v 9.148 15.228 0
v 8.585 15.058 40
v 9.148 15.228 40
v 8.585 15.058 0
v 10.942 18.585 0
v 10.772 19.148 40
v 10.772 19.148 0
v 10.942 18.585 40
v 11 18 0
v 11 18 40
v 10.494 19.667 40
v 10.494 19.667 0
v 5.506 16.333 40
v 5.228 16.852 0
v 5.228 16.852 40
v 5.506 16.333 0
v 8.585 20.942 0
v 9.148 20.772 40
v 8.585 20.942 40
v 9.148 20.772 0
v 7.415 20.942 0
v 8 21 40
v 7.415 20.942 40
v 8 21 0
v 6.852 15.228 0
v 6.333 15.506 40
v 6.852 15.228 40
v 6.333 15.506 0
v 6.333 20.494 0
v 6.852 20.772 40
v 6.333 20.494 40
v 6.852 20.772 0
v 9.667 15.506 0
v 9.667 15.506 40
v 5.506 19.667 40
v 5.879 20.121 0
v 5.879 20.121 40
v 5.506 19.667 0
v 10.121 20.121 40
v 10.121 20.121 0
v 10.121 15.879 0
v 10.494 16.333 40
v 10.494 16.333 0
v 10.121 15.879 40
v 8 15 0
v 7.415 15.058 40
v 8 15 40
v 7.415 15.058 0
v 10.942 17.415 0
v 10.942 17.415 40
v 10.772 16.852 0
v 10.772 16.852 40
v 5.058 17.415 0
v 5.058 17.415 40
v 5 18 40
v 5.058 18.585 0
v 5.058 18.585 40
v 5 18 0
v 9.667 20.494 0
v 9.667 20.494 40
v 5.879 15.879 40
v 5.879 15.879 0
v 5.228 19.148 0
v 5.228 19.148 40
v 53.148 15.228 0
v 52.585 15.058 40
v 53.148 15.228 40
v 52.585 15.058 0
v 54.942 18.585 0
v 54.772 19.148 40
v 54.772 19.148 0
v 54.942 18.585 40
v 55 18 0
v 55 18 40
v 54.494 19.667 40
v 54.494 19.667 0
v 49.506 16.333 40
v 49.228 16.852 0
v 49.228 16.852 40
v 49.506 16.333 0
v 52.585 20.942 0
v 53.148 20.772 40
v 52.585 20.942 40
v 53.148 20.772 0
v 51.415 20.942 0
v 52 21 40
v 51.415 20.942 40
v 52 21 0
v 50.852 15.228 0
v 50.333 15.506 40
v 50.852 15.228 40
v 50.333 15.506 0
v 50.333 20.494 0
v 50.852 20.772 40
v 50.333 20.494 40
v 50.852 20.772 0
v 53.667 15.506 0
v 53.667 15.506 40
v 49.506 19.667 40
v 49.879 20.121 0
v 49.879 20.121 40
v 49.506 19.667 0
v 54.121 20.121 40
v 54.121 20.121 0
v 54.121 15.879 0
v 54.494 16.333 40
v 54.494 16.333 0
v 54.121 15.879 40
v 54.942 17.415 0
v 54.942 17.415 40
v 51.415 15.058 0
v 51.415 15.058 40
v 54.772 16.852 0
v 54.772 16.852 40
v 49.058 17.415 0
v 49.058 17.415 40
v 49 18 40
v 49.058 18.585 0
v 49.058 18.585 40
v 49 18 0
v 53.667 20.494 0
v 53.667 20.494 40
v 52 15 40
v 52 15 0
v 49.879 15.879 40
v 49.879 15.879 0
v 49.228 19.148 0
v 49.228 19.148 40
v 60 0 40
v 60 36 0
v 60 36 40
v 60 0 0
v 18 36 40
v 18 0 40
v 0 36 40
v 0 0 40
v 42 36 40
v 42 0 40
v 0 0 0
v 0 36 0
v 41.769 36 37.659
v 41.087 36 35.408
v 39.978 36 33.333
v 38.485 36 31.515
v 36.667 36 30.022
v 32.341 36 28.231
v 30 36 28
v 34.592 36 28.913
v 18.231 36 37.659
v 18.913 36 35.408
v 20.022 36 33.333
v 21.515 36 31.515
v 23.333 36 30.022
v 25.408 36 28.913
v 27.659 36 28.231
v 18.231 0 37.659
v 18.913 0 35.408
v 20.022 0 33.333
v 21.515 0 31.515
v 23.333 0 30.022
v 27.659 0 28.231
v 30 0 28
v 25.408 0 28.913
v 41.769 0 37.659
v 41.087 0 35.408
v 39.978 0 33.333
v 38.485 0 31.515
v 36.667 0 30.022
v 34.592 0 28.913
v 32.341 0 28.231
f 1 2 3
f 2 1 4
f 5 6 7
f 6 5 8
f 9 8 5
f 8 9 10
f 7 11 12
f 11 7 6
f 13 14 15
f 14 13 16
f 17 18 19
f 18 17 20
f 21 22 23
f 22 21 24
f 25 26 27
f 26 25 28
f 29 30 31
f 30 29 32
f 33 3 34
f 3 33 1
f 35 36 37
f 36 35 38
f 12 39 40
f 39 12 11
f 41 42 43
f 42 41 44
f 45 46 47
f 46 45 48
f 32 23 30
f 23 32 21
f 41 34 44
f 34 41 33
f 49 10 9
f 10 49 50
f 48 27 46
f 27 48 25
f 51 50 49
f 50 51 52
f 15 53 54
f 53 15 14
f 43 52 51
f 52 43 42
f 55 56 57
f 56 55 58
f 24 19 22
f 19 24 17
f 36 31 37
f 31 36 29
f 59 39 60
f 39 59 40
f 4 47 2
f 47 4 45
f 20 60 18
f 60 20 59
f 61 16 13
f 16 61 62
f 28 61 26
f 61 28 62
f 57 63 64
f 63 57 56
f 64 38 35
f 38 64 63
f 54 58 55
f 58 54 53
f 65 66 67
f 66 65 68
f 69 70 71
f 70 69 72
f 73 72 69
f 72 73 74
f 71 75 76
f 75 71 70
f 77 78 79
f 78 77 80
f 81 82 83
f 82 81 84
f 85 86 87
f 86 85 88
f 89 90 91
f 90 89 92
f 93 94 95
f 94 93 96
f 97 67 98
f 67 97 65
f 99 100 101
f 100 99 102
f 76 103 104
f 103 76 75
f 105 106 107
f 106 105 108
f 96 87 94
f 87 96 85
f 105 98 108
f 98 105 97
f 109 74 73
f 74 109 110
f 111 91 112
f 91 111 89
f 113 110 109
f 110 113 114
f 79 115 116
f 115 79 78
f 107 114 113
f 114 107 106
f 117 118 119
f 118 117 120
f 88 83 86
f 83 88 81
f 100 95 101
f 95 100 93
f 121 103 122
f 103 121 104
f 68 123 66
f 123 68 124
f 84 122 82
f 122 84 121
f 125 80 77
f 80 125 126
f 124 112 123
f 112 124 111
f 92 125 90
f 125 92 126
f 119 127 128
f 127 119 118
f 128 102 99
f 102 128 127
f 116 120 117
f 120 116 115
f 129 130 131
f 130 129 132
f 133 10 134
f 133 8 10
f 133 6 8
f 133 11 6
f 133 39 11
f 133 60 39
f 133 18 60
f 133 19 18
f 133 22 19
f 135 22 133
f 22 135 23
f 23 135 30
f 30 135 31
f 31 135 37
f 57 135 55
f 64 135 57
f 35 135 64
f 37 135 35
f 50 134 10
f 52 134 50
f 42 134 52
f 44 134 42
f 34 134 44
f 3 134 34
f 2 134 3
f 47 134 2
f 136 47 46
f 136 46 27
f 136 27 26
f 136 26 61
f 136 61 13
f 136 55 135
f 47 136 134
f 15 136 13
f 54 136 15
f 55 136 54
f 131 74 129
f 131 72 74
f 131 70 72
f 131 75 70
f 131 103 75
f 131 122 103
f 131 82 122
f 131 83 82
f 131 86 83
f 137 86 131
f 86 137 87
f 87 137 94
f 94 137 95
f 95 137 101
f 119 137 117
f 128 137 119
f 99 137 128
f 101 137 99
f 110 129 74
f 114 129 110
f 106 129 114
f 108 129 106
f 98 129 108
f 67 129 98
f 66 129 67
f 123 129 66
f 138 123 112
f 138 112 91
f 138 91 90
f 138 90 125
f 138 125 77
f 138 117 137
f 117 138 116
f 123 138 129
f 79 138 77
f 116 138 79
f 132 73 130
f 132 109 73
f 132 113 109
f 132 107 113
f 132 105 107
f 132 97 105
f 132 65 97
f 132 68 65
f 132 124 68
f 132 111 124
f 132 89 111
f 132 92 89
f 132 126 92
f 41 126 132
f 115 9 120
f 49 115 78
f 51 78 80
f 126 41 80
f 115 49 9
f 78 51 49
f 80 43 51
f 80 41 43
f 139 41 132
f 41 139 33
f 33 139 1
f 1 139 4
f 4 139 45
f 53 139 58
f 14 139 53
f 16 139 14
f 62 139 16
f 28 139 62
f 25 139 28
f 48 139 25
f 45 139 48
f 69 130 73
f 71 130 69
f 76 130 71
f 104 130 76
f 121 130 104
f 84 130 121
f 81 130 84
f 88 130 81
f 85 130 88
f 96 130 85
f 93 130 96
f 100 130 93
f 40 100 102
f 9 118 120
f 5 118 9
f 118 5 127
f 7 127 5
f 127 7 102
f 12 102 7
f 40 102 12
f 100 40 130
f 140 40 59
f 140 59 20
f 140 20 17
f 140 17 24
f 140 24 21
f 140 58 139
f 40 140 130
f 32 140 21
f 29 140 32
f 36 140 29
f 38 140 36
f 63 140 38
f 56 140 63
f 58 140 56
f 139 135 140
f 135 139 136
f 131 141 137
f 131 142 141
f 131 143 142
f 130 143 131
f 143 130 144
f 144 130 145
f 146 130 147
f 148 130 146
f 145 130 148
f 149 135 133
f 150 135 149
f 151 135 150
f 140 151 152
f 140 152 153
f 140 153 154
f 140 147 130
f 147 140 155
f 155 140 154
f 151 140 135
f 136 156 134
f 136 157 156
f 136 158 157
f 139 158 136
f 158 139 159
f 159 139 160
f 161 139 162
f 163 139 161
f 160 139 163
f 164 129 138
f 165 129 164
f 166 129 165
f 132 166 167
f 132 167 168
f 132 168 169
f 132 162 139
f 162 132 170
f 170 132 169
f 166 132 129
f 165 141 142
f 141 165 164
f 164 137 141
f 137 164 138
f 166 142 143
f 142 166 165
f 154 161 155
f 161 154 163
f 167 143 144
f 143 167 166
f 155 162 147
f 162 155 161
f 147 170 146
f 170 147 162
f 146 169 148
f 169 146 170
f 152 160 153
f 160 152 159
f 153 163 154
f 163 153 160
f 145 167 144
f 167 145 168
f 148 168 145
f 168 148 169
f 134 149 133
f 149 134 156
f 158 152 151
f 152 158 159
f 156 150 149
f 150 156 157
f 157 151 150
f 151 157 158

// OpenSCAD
$fn = 32;

// ----------------------------------------------------------------------
// Saddle clamp: plain shaft clamp
// ----------------------------------------------------------------------

// --- parameters (mm) ---
blk_l = 60;               // block length, X
blk_w = 36;               // block width, Y
blk_h = 40;               // block height
clamp_r = 12;             // shaft groove radius
hole_r = 3;               // bolt hole radius
hole_m = 8;               // bolt hole margin from the ends

saw_depth = clamp_r + 3;  // saw kerf depth

difference() {
  cube([blk_l, blk_w, blk_h]);
  translate([blk_l / 2, -1, blk_h])
    rotate([-90, 0, 0])
      cylinder(h = blk_w + 2, r = clamp_r);
  for (sx = [0, 1])
    translate([sx ? blk_l - hole_m : hole_m, blk_w / 2, -1])
      cylinder(r = hole_r, h = blk_h + 2);
}
